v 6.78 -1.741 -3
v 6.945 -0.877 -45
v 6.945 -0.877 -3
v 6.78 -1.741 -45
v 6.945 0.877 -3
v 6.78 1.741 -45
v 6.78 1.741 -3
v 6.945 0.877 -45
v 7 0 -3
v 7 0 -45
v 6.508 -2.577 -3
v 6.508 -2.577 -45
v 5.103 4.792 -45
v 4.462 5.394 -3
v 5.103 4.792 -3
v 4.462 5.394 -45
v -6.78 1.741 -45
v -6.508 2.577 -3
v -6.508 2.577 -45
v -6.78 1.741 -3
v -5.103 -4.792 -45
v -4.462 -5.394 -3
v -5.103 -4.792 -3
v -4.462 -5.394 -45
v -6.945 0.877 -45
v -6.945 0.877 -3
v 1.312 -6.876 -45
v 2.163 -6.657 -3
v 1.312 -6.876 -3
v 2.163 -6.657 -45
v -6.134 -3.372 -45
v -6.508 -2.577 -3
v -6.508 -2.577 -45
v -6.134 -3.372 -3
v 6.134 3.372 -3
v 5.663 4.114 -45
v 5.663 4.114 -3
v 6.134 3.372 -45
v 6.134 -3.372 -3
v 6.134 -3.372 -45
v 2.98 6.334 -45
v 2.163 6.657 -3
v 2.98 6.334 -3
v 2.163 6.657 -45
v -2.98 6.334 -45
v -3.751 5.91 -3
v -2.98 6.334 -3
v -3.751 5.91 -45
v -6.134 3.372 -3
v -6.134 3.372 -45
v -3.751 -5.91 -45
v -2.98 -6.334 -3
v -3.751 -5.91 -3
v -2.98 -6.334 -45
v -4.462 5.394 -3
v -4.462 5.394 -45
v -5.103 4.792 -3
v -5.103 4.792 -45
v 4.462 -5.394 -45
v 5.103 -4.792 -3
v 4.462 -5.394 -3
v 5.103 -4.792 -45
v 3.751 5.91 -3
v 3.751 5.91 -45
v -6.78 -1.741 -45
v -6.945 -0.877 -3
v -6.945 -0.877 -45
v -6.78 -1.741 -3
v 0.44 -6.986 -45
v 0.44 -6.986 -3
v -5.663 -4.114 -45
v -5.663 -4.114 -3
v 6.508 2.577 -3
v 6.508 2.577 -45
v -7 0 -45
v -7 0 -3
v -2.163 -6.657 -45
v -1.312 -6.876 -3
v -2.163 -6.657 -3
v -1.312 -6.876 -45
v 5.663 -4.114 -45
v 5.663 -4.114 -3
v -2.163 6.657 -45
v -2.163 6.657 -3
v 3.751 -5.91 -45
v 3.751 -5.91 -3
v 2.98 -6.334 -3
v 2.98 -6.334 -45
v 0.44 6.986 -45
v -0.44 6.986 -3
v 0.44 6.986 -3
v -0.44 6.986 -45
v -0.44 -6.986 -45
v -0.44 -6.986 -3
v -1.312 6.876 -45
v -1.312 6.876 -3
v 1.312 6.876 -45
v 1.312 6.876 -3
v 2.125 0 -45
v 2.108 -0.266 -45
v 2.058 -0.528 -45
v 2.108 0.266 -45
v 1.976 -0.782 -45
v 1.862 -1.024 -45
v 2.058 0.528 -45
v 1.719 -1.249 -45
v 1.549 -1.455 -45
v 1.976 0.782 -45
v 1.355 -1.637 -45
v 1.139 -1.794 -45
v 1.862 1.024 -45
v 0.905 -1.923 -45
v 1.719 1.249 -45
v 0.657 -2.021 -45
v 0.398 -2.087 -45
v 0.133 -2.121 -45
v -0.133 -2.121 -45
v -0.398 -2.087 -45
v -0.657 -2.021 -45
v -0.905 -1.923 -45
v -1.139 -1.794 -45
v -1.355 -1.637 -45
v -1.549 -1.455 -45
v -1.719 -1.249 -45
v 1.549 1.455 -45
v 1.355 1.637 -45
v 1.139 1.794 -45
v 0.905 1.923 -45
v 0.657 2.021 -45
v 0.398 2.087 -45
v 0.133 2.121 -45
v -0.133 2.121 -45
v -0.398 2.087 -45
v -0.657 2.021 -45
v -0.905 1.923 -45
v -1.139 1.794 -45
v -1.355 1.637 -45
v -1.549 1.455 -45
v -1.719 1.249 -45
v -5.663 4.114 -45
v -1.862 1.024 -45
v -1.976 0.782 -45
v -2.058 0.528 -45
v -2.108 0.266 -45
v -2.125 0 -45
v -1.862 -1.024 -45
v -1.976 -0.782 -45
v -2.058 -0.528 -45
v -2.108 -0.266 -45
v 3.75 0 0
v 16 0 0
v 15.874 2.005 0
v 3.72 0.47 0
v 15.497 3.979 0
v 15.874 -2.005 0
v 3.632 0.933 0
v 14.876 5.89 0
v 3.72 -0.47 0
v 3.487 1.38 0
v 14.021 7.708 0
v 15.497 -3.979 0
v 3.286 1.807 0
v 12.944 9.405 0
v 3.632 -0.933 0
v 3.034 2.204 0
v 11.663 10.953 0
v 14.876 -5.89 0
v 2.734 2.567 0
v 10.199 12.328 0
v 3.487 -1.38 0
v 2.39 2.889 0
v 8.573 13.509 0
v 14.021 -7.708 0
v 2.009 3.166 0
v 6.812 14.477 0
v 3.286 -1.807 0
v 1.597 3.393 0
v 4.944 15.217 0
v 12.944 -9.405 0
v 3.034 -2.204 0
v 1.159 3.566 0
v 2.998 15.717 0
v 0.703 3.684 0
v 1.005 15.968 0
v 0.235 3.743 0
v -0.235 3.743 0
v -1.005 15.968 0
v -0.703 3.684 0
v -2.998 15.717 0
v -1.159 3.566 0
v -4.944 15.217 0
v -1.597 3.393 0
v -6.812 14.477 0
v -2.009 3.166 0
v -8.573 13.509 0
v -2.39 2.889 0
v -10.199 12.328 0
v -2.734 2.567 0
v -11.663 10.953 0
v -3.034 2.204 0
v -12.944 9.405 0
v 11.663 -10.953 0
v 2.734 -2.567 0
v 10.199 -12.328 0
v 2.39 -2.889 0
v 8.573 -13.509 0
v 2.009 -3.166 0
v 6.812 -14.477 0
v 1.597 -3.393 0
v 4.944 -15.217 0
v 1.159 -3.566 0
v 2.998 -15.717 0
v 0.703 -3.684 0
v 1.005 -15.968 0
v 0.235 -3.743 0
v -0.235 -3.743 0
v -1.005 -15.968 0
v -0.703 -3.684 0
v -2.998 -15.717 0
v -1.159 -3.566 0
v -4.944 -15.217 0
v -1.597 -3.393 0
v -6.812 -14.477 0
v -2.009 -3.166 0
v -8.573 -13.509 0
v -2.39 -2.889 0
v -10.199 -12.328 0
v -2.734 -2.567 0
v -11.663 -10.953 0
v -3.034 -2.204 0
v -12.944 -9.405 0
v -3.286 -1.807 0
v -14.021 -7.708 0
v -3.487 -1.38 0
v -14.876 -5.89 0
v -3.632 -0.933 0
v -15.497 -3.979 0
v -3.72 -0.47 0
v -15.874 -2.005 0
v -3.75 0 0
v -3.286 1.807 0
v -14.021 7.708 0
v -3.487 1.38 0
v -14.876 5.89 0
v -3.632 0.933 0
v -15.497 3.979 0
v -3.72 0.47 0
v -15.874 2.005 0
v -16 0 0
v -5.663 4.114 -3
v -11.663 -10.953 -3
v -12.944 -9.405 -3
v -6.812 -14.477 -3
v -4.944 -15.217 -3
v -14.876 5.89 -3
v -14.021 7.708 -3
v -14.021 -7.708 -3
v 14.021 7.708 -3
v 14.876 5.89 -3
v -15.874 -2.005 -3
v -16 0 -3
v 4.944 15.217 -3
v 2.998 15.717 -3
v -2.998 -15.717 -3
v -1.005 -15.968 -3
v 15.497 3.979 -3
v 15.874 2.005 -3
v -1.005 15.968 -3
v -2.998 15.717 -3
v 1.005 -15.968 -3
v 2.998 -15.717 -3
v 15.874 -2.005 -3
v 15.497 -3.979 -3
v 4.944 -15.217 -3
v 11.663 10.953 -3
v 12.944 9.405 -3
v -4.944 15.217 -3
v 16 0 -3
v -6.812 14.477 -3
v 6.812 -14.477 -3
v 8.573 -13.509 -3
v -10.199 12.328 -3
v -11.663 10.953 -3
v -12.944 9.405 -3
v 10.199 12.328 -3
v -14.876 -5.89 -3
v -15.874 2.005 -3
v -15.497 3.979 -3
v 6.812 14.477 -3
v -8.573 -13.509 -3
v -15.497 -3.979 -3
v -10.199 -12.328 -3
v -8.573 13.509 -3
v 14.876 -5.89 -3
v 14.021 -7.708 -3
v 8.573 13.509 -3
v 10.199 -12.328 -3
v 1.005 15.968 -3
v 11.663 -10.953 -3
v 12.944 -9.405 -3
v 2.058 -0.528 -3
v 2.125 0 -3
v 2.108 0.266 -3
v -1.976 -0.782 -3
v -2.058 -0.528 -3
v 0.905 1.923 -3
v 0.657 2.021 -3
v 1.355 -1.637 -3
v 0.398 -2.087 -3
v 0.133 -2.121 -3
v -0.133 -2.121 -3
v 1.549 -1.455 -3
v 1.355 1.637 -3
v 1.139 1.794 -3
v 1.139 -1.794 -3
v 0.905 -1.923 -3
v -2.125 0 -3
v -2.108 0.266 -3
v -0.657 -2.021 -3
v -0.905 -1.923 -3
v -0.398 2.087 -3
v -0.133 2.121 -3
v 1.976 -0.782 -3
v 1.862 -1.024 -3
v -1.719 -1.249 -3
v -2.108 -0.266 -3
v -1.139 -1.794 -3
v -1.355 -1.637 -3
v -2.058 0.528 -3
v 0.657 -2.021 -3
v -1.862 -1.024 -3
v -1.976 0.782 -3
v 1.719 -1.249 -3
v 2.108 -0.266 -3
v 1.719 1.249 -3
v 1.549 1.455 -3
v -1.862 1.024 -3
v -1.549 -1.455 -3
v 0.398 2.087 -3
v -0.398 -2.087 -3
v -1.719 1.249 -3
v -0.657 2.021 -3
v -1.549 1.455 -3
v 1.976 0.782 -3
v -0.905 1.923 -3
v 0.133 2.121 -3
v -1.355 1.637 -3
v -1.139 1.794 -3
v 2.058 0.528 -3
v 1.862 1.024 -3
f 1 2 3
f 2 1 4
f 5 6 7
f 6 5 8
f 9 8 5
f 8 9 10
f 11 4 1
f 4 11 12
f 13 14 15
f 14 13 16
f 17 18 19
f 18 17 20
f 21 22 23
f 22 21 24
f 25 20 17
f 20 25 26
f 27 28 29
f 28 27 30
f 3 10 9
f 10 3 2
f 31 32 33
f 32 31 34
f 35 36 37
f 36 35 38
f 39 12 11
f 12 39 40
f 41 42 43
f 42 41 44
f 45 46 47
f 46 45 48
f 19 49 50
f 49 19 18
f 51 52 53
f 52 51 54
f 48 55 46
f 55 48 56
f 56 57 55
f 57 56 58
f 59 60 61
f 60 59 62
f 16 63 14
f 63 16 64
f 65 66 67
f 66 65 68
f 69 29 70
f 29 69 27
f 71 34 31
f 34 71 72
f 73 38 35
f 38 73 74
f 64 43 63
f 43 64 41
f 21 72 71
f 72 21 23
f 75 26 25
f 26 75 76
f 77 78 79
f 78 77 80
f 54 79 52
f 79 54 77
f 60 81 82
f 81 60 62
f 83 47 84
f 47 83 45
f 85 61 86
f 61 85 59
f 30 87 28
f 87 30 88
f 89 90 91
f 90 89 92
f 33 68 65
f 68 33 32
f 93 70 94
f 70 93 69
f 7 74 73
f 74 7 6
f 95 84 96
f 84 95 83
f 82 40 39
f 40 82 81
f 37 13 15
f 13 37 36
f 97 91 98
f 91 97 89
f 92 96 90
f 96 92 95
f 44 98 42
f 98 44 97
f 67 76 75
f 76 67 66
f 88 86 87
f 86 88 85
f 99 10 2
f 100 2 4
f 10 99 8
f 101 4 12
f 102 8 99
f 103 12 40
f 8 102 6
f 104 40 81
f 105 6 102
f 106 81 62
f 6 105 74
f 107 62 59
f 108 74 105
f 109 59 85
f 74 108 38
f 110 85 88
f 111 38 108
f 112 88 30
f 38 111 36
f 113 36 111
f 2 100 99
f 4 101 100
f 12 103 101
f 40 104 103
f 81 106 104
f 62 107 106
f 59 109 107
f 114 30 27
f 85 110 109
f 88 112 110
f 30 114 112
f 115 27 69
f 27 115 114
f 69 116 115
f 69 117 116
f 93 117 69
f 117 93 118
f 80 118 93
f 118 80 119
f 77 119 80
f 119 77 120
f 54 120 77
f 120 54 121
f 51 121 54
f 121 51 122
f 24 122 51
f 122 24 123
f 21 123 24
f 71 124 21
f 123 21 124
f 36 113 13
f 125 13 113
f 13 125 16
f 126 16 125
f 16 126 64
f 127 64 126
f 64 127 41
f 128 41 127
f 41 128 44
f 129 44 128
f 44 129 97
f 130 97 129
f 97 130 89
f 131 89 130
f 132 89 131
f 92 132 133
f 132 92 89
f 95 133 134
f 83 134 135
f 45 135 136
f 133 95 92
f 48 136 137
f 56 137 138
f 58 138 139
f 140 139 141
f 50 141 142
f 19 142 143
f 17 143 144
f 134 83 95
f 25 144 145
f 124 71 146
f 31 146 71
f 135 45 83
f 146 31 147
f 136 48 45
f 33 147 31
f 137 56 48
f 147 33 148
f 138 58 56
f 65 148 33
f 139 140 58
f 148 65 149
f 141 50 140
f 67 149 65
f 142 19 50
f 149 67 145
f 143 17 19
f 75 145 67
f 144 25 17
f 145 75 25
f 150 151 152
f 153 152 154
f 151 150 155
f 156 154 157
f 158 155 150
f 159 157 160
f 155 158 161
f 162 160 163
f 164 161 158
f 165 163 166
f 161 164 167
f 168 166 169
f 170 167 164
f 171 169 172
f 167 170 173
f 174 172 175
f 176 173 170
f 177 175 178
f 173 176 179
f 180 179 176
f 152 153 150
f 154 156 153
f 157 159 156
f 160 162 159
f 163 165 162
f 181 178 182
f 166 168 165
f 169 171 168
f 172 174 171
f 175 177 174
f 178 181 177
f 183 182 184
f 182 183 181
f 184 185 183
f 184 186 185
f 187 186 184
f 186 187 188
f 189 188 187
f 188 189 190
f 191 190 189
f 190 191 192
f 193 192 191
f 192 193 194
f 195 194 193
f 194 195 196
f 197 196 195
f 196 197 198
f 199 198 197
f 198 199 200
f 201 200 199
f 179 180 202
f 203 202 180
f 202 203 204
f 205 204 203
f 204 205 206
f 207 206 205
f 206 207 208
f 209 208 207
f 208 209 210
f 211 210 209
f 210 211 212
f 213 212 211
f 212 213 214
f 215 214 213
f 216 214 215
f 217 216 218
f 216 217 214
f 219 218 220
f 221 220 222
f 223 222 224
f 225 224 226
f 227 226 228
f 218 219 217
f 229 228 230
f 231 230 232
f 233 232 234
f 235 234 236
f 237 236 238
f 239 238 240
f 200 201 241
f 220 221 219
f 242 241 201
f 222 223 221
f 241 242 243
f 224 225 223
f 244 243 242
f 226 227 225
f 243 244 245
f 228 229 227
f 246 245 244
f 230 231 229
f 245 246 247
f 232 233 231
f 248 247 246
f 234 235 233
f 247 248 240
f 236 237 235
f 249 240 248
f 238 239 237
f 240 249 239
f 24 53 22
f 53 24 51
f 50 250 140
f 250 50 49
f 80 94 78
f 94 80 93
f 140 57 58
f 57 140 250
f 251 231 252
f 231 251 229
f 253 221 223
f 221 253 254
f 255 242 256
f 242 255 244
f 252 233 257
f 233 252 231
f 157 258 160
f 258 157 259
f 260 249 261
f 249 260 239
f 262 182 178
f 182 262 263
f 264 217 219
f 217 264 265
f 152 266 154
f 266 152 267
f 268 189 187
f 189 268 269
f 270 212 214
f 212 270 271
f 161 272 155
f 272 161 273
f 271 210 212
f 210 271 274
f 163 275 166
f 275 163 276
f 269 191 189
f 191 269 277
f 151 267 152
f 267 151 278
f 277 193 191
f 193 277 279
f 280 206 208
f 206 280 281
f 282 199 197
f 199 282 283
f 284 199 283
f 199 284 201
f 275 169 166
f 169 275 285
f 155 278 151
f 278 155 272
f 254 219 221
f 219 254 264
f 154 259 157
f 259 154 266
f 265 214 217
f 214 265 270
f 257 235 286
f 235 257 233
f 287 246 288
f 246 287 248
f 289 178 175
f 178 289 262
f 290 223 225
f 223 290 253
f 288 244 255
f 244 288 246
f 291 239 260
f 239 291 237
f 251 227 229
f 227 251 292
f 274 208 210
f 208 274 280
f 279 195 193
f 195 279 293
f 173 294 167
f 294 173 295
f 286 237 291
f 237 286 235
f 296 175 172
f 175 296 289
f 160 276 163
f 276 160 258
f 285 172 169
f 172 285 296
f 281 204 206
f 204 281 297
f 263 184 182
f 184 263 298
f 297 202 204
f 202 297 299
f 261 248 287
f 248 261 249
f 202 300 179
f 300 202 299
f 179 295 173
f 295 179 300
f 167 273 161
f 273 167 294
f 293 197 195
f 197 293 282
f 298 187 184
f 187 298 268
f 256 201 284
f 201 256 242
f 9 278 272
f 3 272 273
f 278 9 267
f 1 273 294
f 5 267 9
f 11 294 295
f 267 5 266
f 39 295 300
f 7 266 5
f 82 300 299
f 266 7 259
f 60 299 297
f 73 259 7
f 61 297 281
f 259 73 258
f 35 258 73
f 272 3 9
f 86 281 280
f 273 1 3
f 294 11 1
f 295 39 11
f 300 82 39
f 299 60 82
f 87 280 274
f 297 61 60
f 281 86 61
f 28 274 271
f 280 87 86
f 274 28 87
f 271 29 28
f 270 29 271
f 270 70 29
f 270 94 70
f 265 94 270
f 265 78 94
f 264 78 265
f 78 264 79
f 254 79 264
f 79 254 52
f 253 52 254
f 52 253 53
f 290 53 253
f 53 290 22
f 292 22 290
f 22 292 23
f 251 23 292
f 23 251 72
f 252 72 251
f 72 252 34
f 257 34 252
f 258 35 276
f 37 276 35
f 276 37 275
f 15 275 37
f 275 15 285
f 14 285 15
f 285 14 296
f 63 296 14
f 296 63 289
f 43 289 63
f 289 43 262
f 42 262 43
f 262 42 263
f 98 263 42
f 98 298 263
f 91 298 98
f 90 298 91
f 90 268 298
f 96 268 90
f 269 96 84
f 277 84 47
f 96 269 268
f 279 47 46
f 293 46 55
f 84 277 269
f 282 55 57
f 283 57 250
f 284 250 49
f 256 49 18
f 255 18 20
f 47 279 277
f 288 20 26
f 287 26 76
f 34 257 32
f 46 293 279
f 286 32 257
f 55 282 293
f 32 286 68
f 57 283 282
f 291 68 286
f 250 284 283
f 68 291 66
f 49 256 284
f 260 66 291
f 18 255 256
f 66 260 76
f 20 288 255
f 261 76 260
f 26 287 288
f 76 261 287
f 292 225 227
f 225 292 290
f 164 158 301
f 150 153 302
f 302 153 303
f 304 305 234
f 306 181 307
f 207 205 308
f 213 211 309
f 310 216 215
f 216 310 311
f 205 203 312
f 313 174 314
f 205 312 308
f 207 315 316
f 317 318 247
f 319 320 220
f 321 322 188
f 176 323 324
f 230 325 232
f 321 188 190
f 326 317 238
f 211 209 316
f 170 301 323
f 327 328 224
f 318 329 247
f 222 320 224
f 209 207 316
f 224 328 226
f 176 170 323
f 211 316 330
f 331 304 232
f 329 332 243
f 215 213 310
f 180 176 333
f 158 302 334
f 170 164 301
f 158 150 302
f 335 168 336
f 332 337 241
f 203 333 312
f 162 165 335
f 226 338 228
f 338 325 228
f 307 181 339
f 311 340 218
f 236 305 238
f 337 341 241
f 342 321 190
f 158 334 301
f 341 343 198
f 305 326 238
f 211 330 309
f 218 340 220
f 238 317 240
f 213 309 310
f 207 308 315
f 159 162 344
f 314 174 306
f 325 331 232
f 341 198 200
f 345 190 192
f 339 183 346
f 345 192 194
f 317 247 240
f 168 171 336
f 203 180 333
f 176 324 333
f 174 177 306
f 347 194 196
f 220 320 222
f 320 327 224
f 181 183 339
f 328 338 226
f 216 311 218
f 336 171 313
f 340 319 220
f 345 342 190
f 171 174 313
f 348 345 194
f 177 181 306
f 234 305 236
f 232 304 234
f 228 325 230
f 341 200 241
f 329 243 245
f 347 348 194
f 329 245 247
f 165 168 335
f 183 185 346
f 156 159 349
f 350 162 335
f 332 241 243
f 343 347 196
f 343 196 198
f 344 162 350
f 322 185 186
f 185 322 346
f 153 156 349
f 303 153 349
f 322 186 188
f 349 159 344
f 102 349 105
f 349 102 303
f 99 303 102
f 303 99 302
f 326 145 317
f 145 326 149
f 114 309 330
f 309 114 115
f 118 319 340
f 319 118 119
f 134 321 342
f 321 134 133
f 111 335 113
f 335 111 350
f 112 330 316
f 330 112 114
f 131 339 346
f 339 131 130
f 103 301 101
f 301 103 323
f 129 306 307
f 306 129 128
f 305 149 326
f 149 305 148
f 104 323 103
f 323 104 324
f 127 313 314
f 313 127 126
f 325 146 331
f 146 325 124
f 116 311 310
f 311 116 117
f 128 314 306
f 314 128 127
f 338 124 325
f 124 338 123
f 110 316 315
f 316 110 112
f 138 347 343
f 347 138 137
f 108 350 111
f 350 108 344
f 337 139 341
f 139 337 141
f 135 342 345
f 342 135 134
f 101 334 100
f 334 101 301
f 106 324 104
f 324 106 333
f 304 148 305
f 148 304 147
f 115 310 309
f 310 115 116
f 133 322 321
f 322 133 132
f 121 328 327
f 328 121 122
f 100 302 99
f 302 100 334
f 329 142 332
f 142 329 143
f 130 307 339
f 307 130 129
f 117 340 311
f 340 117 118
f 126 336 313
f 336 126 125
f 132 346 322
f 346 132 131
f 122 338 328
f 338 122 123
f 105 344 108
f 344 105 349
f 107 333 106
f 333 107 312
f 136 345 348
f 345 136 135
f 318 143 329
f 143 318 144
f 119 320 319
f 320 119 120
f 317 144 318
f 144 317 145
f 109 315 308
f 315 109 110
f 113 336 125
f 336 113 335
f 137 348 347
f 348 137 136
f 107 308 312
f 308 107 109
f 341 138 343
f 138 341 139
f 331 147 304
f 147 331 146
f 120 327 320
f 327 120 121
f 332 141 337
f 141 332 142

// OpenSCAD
$fn = 50;


difference() {
	union() {
		translate(v = [0, 0, -45.0000000000]) {
			cylinder(h = 45, r = 7.0000000000);
		}
		translate(v = [0, 0, -3.0000000000]) {
			cylinder(h = 3, r = 16.0000000000);
		}
	}
	union() {
		translate(v = [0, 0, 0]) {
			rotate(a = [0, 0, 0]) {
				difference() {
					union() {
						#translate(v = [0, 0, -45.0000000000]) {
							cylinder(h = 45, r = 2.0000000000);
						}
						#translate(v = [0, 0, -3]) {
							cylinder(h = 3, r = 7.0000000000, r1 = 2.1250000000, r2 = 3.7500000000);
						}
						#translate(v = [0, 0, -45.0000000000]) {
							cylinder(h = 45, r = 2.1250000000);
						}
						#translate(v = [0, 0, -45.0000000000]) {
							cylinder(h = 45, r = 2.0000000000);
						}
					}
					union();
				}
			}
		}
	}
}
